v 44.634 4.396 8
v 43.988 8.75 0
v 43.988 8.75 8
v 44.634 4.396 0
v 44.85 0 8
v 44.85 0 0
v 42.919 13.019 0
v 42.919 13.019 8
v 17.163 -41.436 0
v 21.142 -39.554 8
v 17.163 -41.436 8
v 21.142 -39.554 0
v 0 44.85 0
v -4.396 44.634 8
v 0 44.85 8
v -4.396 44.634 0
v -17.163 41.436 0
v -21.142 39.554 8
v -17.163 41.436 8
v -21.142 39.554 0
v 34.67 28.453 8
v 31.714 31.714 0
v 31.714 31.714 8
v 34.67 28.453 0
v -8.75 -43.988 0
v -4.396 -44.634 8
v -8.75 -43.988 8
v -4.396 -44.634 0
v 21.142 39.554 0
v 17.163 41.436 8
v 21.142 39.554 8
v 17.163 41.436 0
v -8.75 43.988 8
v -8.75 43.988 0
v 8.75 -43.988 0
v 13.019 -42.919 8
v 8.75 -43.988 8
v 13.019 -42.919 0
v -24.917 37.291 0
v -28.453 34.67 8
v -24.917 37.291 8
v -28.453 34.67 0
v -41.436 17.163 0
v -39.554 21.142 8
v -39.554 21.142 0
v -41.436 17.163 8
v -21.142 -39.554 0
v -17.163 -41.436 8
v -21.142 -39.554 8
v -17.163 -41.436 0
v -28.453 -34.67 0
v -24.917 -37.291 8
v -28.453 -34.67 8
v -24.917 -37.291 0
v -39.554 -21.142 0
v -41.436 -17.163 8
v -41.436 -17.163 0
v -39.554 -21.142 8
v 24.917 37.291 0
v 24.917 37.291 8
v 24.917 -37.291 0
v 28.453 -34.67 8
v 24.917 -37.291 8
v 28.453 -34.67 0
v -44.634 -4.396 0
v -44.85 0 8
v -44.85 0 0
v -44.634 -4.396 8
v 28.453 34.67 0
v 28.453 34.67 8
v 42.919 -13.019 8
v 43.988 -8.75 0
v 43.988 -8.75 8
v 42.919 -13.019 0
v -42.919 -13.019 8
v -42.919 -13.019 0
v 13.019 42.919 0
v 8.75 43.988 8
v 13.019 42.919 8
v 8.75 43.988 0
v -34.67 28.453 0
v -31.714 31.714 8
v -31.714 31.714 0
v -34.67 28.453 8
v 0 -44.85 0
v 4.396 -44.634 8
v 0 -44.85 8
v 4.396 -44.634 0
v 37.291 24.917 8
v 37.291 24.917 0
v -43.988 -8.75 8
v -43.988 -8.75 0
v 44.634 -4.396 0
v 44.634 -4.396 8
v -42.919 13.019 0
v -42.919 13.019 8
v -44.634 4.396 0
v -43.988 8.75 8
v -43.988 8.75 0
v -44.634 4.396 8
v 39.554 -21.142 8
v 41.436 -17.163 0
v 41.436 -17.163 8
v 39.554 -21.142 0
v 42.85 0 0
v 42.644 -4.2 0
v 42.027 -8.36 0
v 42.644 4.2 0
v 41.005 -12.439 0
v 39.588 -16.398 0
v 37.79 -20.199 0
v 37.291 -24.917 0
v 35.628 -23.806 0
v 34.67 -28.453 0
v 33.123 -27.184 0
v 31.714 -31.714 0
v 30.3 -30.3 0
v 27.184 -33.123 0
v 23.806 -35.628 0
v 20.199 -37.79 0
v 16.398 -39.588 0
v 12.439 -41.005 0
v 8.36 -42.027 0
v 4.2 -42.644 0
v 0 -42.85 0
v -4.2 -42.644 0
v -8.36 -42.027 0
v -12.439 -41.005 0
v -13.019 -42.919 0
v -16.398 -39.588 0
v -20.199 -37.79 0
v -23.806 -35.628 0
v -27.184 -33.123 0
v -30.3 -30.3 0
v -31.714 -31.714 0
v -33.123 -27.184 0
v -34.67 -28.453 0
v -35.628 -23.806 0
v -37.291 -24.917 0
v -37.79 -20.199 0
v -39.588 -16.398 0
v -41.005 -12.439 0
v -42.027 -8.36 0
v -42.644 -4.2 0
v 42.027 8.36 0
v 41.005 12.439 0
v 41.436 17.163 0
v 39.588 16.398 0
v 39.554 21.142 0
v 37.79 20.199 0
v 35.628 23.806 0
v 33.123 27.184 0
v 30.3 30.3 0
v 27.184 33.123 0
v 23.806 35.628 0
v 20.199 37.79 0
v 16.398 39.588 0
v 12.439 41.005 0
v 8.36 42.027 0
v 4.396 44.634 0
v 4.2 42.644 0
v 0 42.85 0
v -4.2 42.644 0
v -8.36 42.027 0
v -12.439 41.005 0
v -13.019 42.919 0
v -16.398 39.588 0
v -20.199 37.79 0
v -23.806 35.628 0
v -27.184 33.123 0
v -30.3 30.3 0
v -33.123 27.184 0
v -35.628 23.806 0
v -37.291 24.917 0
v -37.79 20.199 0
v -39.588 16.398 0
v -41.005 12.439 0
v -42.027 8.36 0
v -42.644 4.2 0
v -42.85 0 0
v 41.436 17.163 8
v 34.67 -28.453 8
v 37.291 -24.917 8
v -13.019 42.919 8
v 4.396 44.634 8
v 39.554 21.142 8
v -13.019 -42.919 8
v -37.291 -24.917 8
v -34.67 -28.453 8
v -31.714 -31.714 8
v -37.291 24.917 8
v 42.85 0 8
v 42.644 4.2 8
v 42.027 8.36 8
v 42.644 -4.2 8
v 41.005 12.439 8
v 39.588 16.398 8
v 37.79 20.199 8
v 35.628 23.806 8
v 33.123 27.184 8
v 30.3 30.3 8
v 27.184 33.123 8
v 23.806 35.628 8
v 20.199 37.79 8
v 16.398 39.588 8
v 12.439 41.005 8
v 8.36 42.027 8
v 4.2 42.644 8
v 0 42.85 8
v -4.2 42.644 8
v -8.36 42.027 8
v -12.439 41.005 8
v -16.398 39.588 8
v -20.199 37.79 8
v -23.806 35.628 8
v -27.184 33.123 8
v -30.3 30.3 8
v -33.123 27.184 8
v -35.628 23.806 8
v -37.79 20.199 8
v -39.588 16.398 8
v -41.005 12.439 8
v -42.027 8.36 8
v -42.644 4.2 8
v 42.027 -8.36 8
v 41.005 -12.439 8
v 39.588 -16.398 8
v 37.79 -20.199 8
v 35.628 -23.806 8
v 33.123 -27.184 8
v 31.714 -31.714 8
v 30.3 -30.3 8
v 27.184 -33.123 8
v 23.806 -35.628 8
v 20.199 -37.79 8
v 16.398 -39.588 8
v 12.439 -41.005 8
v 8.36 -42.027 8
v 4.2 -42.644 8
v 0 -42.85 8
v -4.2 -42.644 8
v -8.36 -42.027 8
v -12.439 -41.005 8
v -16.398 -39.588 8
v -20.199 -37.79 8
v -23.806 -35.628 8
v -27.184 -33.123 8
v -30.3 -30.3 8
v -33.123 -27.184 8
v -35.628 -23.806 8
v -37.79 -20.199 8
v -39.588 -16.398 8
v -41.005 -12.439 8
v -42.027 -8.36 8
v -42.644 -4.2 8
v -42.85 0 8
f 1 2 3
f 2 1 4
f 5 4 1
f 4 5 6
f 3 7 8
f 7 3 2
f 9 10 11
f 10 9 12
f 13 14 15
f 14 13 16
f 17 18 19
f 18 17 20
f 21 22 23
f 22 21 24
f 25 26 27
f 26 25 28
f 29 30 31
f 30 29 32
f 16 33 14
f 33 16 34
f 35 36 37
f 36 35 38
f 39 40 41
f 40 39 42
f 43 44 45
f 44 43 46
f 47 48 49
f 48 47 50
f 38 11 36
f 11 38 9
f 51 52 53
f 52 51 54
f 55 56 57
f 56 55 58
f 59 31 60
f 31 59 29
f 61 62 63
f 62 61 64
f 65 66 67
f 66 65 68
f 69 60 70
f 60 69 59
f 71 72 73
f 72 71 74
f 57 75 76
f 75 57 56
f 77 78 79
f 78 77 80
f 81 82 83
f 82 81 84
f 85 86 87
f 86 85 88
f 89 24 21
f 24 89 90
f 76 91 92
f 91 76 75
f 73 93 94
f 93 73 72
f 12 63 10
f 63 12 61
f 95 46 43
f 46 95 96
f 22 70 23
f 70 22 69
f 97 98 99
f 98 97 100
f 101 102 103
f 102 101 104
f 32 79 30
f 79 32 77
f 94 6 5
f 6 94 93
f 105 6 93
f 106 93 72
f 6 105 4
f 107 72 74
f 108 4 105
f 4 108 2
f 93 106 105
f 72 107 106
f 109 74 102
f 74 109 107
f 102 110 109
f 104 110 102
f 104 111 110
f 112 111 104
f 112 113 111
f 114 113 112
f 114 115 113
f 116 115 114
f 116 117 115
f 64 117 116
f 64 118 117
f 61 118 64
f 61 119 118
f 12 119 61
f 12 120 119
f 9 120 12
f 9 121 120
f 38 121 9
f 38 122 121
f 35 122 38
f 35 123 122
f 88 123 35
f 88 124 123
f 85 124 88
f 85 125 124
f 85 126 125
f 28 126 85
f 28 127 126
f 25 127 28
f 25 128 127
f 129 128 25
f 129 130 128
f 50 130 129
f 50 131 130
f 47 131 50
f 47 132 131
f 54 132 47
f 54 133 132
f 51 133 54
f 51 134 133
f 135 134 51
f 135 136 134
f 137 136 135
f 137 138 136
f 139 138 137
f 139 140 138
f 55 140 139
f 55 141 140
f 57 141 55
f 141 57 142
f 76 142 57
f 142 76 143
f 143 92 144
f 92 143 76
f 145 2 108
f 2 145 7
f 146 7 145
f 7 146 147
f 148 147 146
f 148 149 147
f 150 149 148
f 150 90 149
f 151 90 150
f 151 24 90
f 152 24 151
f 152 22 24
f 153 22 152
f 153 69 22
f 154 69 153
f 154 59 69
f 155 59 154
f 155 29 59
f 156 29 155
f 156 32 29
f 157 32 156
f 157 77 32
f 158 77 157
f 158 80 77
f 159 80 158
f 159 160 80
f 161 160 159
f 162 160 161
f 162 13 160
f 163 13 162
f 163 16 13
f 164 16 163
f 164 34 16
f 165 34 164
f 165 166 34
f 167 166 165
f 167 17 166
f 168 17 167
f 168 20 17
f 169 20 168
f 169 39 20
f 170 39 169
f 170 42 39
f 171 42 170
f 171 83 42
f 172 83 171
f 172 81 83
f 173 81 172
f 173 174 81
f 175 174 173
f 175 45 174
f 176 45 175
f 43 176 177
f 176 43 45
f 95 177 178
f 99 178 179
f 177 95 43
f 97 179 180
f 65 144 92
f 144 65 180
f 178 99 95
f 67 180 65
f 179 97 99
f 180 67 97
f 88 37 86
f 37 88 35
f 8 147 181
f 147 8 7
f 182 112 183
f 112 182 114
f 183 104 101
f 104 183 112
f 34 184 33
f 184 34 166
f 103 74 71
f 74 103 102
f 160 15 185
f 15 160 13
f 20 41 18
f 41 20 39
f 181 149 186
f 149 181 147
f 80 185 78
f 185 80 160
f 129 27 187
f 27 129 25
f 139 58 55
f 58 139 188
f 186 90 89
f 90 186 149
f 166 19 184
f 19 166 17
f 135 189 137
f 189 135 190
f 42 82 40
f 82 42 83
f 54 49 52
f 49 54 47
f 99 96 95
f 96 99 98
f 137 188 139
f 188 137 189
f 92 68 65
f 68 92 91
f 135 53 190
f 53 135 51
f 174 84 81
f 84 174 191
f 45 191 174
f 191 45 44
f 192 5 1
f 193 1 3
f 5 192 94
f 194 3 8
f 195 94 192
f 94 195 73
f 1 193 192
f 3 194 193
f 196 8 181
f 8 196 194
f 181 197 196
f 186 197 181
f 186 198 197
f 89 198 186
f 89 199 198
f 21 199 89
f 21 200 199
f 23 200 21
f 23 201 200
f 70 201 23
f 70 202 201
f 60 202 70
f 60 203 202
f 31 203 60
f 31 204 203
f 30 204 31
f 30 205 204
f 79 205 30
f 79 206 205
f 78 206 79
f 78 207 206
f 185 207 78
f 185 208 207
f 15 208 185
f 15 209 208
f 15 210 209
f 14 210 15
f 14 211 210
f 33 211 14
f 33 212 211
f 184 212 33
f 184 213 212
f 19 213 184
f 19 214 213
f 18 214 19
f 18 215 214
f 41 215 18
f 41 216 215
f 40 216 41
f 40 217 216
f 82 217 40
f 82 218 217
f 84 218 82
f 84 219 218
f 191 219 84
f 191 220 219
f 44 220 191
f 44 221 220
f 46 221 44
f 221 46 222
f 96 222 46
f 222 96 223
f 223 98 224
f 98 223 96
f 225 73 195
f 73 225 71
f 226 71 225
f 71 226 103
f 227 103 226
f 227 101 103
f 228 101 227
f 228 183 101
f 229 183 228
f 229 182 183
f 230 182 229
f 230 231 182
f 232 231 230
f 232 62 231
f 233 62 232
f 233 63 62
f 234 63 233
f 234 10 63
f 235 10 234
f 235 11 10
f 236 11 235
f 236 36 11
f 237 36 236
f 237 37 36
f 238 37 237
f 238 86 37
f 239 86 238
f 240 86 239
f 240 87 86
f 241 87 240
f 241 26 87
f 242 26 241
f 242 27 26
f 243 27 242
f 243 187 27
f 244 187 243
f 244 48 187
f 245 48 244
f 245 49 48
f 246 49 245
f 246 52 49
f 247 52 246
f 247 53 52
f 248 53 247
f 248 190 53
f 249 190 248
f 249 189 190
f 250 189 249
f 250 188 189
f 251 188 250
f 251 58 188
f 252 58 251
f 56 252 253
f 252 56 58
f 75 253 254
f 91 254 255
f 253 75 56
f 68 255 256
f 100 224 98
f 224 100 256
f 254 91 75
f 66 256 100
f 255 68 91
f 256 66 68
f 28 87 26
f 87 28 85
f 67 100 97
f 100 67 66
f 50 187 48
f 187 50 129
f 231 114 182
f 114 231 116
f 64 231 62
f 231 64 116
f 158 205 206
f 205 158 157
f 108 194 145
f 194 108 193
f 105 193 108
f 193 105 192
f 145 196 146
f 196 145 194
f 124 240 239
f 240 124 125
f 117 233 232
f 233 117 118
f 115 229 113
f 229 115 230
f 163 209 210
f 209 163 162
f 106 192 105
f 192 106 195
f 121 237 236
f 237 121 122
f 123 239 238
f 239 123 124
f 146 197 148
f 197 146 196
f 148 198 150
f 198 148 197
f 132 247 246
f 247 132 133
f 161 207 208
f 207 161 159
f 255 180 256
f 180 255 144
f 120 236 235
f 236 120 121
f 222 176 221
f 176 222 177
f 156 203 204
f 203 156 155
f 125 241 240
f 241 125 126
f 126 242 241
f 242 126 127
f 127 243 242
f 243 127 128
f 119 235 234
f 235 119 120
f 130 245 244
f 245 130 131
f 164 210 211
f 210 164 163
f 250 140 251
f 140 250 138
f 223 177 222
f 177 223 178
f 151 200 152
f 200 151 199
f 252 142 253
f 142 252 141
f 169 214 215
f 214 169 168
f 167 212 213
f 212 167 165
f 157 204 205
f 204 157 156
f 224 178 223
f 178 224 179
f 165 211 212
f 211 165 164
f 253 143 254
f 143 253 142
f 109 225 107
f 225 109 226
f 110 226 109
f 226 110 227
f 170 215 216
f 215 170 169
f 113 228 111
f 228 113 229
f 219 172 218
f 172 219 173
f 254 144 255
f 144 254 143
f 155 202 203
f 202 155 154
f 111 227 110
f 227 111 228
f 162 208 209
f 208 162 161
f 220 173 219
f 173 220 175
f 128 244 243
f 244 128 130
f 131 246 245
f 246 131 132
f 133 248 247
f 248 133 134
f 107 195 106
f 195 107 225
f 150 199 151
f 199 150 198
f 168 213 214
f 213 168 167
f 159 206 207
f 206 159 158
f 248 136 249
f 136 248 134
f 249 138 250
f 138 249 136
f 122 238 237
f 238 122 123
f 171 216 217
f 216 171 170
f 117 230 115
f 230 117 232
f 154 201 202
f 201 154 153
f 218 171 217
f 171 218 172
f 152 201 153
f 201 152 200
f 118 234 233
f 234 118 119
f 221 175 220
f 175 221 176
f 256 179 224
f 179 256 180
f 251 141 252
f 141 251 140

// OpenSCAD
glass_h = 10;
glass_r = 40.75;

outer_shell_h = 8;
inner_shell_r = glass_r + 2.1;

outer_shell_r = inner_shell_r + 2;


roundness = 64;

difference() {
    cylinder(h = outer_shell_h, r = outer_shell_r, $fn = roundness);
    cylinder(h = glass_h, r = inner_shell_r, $fn = roundness);
}
